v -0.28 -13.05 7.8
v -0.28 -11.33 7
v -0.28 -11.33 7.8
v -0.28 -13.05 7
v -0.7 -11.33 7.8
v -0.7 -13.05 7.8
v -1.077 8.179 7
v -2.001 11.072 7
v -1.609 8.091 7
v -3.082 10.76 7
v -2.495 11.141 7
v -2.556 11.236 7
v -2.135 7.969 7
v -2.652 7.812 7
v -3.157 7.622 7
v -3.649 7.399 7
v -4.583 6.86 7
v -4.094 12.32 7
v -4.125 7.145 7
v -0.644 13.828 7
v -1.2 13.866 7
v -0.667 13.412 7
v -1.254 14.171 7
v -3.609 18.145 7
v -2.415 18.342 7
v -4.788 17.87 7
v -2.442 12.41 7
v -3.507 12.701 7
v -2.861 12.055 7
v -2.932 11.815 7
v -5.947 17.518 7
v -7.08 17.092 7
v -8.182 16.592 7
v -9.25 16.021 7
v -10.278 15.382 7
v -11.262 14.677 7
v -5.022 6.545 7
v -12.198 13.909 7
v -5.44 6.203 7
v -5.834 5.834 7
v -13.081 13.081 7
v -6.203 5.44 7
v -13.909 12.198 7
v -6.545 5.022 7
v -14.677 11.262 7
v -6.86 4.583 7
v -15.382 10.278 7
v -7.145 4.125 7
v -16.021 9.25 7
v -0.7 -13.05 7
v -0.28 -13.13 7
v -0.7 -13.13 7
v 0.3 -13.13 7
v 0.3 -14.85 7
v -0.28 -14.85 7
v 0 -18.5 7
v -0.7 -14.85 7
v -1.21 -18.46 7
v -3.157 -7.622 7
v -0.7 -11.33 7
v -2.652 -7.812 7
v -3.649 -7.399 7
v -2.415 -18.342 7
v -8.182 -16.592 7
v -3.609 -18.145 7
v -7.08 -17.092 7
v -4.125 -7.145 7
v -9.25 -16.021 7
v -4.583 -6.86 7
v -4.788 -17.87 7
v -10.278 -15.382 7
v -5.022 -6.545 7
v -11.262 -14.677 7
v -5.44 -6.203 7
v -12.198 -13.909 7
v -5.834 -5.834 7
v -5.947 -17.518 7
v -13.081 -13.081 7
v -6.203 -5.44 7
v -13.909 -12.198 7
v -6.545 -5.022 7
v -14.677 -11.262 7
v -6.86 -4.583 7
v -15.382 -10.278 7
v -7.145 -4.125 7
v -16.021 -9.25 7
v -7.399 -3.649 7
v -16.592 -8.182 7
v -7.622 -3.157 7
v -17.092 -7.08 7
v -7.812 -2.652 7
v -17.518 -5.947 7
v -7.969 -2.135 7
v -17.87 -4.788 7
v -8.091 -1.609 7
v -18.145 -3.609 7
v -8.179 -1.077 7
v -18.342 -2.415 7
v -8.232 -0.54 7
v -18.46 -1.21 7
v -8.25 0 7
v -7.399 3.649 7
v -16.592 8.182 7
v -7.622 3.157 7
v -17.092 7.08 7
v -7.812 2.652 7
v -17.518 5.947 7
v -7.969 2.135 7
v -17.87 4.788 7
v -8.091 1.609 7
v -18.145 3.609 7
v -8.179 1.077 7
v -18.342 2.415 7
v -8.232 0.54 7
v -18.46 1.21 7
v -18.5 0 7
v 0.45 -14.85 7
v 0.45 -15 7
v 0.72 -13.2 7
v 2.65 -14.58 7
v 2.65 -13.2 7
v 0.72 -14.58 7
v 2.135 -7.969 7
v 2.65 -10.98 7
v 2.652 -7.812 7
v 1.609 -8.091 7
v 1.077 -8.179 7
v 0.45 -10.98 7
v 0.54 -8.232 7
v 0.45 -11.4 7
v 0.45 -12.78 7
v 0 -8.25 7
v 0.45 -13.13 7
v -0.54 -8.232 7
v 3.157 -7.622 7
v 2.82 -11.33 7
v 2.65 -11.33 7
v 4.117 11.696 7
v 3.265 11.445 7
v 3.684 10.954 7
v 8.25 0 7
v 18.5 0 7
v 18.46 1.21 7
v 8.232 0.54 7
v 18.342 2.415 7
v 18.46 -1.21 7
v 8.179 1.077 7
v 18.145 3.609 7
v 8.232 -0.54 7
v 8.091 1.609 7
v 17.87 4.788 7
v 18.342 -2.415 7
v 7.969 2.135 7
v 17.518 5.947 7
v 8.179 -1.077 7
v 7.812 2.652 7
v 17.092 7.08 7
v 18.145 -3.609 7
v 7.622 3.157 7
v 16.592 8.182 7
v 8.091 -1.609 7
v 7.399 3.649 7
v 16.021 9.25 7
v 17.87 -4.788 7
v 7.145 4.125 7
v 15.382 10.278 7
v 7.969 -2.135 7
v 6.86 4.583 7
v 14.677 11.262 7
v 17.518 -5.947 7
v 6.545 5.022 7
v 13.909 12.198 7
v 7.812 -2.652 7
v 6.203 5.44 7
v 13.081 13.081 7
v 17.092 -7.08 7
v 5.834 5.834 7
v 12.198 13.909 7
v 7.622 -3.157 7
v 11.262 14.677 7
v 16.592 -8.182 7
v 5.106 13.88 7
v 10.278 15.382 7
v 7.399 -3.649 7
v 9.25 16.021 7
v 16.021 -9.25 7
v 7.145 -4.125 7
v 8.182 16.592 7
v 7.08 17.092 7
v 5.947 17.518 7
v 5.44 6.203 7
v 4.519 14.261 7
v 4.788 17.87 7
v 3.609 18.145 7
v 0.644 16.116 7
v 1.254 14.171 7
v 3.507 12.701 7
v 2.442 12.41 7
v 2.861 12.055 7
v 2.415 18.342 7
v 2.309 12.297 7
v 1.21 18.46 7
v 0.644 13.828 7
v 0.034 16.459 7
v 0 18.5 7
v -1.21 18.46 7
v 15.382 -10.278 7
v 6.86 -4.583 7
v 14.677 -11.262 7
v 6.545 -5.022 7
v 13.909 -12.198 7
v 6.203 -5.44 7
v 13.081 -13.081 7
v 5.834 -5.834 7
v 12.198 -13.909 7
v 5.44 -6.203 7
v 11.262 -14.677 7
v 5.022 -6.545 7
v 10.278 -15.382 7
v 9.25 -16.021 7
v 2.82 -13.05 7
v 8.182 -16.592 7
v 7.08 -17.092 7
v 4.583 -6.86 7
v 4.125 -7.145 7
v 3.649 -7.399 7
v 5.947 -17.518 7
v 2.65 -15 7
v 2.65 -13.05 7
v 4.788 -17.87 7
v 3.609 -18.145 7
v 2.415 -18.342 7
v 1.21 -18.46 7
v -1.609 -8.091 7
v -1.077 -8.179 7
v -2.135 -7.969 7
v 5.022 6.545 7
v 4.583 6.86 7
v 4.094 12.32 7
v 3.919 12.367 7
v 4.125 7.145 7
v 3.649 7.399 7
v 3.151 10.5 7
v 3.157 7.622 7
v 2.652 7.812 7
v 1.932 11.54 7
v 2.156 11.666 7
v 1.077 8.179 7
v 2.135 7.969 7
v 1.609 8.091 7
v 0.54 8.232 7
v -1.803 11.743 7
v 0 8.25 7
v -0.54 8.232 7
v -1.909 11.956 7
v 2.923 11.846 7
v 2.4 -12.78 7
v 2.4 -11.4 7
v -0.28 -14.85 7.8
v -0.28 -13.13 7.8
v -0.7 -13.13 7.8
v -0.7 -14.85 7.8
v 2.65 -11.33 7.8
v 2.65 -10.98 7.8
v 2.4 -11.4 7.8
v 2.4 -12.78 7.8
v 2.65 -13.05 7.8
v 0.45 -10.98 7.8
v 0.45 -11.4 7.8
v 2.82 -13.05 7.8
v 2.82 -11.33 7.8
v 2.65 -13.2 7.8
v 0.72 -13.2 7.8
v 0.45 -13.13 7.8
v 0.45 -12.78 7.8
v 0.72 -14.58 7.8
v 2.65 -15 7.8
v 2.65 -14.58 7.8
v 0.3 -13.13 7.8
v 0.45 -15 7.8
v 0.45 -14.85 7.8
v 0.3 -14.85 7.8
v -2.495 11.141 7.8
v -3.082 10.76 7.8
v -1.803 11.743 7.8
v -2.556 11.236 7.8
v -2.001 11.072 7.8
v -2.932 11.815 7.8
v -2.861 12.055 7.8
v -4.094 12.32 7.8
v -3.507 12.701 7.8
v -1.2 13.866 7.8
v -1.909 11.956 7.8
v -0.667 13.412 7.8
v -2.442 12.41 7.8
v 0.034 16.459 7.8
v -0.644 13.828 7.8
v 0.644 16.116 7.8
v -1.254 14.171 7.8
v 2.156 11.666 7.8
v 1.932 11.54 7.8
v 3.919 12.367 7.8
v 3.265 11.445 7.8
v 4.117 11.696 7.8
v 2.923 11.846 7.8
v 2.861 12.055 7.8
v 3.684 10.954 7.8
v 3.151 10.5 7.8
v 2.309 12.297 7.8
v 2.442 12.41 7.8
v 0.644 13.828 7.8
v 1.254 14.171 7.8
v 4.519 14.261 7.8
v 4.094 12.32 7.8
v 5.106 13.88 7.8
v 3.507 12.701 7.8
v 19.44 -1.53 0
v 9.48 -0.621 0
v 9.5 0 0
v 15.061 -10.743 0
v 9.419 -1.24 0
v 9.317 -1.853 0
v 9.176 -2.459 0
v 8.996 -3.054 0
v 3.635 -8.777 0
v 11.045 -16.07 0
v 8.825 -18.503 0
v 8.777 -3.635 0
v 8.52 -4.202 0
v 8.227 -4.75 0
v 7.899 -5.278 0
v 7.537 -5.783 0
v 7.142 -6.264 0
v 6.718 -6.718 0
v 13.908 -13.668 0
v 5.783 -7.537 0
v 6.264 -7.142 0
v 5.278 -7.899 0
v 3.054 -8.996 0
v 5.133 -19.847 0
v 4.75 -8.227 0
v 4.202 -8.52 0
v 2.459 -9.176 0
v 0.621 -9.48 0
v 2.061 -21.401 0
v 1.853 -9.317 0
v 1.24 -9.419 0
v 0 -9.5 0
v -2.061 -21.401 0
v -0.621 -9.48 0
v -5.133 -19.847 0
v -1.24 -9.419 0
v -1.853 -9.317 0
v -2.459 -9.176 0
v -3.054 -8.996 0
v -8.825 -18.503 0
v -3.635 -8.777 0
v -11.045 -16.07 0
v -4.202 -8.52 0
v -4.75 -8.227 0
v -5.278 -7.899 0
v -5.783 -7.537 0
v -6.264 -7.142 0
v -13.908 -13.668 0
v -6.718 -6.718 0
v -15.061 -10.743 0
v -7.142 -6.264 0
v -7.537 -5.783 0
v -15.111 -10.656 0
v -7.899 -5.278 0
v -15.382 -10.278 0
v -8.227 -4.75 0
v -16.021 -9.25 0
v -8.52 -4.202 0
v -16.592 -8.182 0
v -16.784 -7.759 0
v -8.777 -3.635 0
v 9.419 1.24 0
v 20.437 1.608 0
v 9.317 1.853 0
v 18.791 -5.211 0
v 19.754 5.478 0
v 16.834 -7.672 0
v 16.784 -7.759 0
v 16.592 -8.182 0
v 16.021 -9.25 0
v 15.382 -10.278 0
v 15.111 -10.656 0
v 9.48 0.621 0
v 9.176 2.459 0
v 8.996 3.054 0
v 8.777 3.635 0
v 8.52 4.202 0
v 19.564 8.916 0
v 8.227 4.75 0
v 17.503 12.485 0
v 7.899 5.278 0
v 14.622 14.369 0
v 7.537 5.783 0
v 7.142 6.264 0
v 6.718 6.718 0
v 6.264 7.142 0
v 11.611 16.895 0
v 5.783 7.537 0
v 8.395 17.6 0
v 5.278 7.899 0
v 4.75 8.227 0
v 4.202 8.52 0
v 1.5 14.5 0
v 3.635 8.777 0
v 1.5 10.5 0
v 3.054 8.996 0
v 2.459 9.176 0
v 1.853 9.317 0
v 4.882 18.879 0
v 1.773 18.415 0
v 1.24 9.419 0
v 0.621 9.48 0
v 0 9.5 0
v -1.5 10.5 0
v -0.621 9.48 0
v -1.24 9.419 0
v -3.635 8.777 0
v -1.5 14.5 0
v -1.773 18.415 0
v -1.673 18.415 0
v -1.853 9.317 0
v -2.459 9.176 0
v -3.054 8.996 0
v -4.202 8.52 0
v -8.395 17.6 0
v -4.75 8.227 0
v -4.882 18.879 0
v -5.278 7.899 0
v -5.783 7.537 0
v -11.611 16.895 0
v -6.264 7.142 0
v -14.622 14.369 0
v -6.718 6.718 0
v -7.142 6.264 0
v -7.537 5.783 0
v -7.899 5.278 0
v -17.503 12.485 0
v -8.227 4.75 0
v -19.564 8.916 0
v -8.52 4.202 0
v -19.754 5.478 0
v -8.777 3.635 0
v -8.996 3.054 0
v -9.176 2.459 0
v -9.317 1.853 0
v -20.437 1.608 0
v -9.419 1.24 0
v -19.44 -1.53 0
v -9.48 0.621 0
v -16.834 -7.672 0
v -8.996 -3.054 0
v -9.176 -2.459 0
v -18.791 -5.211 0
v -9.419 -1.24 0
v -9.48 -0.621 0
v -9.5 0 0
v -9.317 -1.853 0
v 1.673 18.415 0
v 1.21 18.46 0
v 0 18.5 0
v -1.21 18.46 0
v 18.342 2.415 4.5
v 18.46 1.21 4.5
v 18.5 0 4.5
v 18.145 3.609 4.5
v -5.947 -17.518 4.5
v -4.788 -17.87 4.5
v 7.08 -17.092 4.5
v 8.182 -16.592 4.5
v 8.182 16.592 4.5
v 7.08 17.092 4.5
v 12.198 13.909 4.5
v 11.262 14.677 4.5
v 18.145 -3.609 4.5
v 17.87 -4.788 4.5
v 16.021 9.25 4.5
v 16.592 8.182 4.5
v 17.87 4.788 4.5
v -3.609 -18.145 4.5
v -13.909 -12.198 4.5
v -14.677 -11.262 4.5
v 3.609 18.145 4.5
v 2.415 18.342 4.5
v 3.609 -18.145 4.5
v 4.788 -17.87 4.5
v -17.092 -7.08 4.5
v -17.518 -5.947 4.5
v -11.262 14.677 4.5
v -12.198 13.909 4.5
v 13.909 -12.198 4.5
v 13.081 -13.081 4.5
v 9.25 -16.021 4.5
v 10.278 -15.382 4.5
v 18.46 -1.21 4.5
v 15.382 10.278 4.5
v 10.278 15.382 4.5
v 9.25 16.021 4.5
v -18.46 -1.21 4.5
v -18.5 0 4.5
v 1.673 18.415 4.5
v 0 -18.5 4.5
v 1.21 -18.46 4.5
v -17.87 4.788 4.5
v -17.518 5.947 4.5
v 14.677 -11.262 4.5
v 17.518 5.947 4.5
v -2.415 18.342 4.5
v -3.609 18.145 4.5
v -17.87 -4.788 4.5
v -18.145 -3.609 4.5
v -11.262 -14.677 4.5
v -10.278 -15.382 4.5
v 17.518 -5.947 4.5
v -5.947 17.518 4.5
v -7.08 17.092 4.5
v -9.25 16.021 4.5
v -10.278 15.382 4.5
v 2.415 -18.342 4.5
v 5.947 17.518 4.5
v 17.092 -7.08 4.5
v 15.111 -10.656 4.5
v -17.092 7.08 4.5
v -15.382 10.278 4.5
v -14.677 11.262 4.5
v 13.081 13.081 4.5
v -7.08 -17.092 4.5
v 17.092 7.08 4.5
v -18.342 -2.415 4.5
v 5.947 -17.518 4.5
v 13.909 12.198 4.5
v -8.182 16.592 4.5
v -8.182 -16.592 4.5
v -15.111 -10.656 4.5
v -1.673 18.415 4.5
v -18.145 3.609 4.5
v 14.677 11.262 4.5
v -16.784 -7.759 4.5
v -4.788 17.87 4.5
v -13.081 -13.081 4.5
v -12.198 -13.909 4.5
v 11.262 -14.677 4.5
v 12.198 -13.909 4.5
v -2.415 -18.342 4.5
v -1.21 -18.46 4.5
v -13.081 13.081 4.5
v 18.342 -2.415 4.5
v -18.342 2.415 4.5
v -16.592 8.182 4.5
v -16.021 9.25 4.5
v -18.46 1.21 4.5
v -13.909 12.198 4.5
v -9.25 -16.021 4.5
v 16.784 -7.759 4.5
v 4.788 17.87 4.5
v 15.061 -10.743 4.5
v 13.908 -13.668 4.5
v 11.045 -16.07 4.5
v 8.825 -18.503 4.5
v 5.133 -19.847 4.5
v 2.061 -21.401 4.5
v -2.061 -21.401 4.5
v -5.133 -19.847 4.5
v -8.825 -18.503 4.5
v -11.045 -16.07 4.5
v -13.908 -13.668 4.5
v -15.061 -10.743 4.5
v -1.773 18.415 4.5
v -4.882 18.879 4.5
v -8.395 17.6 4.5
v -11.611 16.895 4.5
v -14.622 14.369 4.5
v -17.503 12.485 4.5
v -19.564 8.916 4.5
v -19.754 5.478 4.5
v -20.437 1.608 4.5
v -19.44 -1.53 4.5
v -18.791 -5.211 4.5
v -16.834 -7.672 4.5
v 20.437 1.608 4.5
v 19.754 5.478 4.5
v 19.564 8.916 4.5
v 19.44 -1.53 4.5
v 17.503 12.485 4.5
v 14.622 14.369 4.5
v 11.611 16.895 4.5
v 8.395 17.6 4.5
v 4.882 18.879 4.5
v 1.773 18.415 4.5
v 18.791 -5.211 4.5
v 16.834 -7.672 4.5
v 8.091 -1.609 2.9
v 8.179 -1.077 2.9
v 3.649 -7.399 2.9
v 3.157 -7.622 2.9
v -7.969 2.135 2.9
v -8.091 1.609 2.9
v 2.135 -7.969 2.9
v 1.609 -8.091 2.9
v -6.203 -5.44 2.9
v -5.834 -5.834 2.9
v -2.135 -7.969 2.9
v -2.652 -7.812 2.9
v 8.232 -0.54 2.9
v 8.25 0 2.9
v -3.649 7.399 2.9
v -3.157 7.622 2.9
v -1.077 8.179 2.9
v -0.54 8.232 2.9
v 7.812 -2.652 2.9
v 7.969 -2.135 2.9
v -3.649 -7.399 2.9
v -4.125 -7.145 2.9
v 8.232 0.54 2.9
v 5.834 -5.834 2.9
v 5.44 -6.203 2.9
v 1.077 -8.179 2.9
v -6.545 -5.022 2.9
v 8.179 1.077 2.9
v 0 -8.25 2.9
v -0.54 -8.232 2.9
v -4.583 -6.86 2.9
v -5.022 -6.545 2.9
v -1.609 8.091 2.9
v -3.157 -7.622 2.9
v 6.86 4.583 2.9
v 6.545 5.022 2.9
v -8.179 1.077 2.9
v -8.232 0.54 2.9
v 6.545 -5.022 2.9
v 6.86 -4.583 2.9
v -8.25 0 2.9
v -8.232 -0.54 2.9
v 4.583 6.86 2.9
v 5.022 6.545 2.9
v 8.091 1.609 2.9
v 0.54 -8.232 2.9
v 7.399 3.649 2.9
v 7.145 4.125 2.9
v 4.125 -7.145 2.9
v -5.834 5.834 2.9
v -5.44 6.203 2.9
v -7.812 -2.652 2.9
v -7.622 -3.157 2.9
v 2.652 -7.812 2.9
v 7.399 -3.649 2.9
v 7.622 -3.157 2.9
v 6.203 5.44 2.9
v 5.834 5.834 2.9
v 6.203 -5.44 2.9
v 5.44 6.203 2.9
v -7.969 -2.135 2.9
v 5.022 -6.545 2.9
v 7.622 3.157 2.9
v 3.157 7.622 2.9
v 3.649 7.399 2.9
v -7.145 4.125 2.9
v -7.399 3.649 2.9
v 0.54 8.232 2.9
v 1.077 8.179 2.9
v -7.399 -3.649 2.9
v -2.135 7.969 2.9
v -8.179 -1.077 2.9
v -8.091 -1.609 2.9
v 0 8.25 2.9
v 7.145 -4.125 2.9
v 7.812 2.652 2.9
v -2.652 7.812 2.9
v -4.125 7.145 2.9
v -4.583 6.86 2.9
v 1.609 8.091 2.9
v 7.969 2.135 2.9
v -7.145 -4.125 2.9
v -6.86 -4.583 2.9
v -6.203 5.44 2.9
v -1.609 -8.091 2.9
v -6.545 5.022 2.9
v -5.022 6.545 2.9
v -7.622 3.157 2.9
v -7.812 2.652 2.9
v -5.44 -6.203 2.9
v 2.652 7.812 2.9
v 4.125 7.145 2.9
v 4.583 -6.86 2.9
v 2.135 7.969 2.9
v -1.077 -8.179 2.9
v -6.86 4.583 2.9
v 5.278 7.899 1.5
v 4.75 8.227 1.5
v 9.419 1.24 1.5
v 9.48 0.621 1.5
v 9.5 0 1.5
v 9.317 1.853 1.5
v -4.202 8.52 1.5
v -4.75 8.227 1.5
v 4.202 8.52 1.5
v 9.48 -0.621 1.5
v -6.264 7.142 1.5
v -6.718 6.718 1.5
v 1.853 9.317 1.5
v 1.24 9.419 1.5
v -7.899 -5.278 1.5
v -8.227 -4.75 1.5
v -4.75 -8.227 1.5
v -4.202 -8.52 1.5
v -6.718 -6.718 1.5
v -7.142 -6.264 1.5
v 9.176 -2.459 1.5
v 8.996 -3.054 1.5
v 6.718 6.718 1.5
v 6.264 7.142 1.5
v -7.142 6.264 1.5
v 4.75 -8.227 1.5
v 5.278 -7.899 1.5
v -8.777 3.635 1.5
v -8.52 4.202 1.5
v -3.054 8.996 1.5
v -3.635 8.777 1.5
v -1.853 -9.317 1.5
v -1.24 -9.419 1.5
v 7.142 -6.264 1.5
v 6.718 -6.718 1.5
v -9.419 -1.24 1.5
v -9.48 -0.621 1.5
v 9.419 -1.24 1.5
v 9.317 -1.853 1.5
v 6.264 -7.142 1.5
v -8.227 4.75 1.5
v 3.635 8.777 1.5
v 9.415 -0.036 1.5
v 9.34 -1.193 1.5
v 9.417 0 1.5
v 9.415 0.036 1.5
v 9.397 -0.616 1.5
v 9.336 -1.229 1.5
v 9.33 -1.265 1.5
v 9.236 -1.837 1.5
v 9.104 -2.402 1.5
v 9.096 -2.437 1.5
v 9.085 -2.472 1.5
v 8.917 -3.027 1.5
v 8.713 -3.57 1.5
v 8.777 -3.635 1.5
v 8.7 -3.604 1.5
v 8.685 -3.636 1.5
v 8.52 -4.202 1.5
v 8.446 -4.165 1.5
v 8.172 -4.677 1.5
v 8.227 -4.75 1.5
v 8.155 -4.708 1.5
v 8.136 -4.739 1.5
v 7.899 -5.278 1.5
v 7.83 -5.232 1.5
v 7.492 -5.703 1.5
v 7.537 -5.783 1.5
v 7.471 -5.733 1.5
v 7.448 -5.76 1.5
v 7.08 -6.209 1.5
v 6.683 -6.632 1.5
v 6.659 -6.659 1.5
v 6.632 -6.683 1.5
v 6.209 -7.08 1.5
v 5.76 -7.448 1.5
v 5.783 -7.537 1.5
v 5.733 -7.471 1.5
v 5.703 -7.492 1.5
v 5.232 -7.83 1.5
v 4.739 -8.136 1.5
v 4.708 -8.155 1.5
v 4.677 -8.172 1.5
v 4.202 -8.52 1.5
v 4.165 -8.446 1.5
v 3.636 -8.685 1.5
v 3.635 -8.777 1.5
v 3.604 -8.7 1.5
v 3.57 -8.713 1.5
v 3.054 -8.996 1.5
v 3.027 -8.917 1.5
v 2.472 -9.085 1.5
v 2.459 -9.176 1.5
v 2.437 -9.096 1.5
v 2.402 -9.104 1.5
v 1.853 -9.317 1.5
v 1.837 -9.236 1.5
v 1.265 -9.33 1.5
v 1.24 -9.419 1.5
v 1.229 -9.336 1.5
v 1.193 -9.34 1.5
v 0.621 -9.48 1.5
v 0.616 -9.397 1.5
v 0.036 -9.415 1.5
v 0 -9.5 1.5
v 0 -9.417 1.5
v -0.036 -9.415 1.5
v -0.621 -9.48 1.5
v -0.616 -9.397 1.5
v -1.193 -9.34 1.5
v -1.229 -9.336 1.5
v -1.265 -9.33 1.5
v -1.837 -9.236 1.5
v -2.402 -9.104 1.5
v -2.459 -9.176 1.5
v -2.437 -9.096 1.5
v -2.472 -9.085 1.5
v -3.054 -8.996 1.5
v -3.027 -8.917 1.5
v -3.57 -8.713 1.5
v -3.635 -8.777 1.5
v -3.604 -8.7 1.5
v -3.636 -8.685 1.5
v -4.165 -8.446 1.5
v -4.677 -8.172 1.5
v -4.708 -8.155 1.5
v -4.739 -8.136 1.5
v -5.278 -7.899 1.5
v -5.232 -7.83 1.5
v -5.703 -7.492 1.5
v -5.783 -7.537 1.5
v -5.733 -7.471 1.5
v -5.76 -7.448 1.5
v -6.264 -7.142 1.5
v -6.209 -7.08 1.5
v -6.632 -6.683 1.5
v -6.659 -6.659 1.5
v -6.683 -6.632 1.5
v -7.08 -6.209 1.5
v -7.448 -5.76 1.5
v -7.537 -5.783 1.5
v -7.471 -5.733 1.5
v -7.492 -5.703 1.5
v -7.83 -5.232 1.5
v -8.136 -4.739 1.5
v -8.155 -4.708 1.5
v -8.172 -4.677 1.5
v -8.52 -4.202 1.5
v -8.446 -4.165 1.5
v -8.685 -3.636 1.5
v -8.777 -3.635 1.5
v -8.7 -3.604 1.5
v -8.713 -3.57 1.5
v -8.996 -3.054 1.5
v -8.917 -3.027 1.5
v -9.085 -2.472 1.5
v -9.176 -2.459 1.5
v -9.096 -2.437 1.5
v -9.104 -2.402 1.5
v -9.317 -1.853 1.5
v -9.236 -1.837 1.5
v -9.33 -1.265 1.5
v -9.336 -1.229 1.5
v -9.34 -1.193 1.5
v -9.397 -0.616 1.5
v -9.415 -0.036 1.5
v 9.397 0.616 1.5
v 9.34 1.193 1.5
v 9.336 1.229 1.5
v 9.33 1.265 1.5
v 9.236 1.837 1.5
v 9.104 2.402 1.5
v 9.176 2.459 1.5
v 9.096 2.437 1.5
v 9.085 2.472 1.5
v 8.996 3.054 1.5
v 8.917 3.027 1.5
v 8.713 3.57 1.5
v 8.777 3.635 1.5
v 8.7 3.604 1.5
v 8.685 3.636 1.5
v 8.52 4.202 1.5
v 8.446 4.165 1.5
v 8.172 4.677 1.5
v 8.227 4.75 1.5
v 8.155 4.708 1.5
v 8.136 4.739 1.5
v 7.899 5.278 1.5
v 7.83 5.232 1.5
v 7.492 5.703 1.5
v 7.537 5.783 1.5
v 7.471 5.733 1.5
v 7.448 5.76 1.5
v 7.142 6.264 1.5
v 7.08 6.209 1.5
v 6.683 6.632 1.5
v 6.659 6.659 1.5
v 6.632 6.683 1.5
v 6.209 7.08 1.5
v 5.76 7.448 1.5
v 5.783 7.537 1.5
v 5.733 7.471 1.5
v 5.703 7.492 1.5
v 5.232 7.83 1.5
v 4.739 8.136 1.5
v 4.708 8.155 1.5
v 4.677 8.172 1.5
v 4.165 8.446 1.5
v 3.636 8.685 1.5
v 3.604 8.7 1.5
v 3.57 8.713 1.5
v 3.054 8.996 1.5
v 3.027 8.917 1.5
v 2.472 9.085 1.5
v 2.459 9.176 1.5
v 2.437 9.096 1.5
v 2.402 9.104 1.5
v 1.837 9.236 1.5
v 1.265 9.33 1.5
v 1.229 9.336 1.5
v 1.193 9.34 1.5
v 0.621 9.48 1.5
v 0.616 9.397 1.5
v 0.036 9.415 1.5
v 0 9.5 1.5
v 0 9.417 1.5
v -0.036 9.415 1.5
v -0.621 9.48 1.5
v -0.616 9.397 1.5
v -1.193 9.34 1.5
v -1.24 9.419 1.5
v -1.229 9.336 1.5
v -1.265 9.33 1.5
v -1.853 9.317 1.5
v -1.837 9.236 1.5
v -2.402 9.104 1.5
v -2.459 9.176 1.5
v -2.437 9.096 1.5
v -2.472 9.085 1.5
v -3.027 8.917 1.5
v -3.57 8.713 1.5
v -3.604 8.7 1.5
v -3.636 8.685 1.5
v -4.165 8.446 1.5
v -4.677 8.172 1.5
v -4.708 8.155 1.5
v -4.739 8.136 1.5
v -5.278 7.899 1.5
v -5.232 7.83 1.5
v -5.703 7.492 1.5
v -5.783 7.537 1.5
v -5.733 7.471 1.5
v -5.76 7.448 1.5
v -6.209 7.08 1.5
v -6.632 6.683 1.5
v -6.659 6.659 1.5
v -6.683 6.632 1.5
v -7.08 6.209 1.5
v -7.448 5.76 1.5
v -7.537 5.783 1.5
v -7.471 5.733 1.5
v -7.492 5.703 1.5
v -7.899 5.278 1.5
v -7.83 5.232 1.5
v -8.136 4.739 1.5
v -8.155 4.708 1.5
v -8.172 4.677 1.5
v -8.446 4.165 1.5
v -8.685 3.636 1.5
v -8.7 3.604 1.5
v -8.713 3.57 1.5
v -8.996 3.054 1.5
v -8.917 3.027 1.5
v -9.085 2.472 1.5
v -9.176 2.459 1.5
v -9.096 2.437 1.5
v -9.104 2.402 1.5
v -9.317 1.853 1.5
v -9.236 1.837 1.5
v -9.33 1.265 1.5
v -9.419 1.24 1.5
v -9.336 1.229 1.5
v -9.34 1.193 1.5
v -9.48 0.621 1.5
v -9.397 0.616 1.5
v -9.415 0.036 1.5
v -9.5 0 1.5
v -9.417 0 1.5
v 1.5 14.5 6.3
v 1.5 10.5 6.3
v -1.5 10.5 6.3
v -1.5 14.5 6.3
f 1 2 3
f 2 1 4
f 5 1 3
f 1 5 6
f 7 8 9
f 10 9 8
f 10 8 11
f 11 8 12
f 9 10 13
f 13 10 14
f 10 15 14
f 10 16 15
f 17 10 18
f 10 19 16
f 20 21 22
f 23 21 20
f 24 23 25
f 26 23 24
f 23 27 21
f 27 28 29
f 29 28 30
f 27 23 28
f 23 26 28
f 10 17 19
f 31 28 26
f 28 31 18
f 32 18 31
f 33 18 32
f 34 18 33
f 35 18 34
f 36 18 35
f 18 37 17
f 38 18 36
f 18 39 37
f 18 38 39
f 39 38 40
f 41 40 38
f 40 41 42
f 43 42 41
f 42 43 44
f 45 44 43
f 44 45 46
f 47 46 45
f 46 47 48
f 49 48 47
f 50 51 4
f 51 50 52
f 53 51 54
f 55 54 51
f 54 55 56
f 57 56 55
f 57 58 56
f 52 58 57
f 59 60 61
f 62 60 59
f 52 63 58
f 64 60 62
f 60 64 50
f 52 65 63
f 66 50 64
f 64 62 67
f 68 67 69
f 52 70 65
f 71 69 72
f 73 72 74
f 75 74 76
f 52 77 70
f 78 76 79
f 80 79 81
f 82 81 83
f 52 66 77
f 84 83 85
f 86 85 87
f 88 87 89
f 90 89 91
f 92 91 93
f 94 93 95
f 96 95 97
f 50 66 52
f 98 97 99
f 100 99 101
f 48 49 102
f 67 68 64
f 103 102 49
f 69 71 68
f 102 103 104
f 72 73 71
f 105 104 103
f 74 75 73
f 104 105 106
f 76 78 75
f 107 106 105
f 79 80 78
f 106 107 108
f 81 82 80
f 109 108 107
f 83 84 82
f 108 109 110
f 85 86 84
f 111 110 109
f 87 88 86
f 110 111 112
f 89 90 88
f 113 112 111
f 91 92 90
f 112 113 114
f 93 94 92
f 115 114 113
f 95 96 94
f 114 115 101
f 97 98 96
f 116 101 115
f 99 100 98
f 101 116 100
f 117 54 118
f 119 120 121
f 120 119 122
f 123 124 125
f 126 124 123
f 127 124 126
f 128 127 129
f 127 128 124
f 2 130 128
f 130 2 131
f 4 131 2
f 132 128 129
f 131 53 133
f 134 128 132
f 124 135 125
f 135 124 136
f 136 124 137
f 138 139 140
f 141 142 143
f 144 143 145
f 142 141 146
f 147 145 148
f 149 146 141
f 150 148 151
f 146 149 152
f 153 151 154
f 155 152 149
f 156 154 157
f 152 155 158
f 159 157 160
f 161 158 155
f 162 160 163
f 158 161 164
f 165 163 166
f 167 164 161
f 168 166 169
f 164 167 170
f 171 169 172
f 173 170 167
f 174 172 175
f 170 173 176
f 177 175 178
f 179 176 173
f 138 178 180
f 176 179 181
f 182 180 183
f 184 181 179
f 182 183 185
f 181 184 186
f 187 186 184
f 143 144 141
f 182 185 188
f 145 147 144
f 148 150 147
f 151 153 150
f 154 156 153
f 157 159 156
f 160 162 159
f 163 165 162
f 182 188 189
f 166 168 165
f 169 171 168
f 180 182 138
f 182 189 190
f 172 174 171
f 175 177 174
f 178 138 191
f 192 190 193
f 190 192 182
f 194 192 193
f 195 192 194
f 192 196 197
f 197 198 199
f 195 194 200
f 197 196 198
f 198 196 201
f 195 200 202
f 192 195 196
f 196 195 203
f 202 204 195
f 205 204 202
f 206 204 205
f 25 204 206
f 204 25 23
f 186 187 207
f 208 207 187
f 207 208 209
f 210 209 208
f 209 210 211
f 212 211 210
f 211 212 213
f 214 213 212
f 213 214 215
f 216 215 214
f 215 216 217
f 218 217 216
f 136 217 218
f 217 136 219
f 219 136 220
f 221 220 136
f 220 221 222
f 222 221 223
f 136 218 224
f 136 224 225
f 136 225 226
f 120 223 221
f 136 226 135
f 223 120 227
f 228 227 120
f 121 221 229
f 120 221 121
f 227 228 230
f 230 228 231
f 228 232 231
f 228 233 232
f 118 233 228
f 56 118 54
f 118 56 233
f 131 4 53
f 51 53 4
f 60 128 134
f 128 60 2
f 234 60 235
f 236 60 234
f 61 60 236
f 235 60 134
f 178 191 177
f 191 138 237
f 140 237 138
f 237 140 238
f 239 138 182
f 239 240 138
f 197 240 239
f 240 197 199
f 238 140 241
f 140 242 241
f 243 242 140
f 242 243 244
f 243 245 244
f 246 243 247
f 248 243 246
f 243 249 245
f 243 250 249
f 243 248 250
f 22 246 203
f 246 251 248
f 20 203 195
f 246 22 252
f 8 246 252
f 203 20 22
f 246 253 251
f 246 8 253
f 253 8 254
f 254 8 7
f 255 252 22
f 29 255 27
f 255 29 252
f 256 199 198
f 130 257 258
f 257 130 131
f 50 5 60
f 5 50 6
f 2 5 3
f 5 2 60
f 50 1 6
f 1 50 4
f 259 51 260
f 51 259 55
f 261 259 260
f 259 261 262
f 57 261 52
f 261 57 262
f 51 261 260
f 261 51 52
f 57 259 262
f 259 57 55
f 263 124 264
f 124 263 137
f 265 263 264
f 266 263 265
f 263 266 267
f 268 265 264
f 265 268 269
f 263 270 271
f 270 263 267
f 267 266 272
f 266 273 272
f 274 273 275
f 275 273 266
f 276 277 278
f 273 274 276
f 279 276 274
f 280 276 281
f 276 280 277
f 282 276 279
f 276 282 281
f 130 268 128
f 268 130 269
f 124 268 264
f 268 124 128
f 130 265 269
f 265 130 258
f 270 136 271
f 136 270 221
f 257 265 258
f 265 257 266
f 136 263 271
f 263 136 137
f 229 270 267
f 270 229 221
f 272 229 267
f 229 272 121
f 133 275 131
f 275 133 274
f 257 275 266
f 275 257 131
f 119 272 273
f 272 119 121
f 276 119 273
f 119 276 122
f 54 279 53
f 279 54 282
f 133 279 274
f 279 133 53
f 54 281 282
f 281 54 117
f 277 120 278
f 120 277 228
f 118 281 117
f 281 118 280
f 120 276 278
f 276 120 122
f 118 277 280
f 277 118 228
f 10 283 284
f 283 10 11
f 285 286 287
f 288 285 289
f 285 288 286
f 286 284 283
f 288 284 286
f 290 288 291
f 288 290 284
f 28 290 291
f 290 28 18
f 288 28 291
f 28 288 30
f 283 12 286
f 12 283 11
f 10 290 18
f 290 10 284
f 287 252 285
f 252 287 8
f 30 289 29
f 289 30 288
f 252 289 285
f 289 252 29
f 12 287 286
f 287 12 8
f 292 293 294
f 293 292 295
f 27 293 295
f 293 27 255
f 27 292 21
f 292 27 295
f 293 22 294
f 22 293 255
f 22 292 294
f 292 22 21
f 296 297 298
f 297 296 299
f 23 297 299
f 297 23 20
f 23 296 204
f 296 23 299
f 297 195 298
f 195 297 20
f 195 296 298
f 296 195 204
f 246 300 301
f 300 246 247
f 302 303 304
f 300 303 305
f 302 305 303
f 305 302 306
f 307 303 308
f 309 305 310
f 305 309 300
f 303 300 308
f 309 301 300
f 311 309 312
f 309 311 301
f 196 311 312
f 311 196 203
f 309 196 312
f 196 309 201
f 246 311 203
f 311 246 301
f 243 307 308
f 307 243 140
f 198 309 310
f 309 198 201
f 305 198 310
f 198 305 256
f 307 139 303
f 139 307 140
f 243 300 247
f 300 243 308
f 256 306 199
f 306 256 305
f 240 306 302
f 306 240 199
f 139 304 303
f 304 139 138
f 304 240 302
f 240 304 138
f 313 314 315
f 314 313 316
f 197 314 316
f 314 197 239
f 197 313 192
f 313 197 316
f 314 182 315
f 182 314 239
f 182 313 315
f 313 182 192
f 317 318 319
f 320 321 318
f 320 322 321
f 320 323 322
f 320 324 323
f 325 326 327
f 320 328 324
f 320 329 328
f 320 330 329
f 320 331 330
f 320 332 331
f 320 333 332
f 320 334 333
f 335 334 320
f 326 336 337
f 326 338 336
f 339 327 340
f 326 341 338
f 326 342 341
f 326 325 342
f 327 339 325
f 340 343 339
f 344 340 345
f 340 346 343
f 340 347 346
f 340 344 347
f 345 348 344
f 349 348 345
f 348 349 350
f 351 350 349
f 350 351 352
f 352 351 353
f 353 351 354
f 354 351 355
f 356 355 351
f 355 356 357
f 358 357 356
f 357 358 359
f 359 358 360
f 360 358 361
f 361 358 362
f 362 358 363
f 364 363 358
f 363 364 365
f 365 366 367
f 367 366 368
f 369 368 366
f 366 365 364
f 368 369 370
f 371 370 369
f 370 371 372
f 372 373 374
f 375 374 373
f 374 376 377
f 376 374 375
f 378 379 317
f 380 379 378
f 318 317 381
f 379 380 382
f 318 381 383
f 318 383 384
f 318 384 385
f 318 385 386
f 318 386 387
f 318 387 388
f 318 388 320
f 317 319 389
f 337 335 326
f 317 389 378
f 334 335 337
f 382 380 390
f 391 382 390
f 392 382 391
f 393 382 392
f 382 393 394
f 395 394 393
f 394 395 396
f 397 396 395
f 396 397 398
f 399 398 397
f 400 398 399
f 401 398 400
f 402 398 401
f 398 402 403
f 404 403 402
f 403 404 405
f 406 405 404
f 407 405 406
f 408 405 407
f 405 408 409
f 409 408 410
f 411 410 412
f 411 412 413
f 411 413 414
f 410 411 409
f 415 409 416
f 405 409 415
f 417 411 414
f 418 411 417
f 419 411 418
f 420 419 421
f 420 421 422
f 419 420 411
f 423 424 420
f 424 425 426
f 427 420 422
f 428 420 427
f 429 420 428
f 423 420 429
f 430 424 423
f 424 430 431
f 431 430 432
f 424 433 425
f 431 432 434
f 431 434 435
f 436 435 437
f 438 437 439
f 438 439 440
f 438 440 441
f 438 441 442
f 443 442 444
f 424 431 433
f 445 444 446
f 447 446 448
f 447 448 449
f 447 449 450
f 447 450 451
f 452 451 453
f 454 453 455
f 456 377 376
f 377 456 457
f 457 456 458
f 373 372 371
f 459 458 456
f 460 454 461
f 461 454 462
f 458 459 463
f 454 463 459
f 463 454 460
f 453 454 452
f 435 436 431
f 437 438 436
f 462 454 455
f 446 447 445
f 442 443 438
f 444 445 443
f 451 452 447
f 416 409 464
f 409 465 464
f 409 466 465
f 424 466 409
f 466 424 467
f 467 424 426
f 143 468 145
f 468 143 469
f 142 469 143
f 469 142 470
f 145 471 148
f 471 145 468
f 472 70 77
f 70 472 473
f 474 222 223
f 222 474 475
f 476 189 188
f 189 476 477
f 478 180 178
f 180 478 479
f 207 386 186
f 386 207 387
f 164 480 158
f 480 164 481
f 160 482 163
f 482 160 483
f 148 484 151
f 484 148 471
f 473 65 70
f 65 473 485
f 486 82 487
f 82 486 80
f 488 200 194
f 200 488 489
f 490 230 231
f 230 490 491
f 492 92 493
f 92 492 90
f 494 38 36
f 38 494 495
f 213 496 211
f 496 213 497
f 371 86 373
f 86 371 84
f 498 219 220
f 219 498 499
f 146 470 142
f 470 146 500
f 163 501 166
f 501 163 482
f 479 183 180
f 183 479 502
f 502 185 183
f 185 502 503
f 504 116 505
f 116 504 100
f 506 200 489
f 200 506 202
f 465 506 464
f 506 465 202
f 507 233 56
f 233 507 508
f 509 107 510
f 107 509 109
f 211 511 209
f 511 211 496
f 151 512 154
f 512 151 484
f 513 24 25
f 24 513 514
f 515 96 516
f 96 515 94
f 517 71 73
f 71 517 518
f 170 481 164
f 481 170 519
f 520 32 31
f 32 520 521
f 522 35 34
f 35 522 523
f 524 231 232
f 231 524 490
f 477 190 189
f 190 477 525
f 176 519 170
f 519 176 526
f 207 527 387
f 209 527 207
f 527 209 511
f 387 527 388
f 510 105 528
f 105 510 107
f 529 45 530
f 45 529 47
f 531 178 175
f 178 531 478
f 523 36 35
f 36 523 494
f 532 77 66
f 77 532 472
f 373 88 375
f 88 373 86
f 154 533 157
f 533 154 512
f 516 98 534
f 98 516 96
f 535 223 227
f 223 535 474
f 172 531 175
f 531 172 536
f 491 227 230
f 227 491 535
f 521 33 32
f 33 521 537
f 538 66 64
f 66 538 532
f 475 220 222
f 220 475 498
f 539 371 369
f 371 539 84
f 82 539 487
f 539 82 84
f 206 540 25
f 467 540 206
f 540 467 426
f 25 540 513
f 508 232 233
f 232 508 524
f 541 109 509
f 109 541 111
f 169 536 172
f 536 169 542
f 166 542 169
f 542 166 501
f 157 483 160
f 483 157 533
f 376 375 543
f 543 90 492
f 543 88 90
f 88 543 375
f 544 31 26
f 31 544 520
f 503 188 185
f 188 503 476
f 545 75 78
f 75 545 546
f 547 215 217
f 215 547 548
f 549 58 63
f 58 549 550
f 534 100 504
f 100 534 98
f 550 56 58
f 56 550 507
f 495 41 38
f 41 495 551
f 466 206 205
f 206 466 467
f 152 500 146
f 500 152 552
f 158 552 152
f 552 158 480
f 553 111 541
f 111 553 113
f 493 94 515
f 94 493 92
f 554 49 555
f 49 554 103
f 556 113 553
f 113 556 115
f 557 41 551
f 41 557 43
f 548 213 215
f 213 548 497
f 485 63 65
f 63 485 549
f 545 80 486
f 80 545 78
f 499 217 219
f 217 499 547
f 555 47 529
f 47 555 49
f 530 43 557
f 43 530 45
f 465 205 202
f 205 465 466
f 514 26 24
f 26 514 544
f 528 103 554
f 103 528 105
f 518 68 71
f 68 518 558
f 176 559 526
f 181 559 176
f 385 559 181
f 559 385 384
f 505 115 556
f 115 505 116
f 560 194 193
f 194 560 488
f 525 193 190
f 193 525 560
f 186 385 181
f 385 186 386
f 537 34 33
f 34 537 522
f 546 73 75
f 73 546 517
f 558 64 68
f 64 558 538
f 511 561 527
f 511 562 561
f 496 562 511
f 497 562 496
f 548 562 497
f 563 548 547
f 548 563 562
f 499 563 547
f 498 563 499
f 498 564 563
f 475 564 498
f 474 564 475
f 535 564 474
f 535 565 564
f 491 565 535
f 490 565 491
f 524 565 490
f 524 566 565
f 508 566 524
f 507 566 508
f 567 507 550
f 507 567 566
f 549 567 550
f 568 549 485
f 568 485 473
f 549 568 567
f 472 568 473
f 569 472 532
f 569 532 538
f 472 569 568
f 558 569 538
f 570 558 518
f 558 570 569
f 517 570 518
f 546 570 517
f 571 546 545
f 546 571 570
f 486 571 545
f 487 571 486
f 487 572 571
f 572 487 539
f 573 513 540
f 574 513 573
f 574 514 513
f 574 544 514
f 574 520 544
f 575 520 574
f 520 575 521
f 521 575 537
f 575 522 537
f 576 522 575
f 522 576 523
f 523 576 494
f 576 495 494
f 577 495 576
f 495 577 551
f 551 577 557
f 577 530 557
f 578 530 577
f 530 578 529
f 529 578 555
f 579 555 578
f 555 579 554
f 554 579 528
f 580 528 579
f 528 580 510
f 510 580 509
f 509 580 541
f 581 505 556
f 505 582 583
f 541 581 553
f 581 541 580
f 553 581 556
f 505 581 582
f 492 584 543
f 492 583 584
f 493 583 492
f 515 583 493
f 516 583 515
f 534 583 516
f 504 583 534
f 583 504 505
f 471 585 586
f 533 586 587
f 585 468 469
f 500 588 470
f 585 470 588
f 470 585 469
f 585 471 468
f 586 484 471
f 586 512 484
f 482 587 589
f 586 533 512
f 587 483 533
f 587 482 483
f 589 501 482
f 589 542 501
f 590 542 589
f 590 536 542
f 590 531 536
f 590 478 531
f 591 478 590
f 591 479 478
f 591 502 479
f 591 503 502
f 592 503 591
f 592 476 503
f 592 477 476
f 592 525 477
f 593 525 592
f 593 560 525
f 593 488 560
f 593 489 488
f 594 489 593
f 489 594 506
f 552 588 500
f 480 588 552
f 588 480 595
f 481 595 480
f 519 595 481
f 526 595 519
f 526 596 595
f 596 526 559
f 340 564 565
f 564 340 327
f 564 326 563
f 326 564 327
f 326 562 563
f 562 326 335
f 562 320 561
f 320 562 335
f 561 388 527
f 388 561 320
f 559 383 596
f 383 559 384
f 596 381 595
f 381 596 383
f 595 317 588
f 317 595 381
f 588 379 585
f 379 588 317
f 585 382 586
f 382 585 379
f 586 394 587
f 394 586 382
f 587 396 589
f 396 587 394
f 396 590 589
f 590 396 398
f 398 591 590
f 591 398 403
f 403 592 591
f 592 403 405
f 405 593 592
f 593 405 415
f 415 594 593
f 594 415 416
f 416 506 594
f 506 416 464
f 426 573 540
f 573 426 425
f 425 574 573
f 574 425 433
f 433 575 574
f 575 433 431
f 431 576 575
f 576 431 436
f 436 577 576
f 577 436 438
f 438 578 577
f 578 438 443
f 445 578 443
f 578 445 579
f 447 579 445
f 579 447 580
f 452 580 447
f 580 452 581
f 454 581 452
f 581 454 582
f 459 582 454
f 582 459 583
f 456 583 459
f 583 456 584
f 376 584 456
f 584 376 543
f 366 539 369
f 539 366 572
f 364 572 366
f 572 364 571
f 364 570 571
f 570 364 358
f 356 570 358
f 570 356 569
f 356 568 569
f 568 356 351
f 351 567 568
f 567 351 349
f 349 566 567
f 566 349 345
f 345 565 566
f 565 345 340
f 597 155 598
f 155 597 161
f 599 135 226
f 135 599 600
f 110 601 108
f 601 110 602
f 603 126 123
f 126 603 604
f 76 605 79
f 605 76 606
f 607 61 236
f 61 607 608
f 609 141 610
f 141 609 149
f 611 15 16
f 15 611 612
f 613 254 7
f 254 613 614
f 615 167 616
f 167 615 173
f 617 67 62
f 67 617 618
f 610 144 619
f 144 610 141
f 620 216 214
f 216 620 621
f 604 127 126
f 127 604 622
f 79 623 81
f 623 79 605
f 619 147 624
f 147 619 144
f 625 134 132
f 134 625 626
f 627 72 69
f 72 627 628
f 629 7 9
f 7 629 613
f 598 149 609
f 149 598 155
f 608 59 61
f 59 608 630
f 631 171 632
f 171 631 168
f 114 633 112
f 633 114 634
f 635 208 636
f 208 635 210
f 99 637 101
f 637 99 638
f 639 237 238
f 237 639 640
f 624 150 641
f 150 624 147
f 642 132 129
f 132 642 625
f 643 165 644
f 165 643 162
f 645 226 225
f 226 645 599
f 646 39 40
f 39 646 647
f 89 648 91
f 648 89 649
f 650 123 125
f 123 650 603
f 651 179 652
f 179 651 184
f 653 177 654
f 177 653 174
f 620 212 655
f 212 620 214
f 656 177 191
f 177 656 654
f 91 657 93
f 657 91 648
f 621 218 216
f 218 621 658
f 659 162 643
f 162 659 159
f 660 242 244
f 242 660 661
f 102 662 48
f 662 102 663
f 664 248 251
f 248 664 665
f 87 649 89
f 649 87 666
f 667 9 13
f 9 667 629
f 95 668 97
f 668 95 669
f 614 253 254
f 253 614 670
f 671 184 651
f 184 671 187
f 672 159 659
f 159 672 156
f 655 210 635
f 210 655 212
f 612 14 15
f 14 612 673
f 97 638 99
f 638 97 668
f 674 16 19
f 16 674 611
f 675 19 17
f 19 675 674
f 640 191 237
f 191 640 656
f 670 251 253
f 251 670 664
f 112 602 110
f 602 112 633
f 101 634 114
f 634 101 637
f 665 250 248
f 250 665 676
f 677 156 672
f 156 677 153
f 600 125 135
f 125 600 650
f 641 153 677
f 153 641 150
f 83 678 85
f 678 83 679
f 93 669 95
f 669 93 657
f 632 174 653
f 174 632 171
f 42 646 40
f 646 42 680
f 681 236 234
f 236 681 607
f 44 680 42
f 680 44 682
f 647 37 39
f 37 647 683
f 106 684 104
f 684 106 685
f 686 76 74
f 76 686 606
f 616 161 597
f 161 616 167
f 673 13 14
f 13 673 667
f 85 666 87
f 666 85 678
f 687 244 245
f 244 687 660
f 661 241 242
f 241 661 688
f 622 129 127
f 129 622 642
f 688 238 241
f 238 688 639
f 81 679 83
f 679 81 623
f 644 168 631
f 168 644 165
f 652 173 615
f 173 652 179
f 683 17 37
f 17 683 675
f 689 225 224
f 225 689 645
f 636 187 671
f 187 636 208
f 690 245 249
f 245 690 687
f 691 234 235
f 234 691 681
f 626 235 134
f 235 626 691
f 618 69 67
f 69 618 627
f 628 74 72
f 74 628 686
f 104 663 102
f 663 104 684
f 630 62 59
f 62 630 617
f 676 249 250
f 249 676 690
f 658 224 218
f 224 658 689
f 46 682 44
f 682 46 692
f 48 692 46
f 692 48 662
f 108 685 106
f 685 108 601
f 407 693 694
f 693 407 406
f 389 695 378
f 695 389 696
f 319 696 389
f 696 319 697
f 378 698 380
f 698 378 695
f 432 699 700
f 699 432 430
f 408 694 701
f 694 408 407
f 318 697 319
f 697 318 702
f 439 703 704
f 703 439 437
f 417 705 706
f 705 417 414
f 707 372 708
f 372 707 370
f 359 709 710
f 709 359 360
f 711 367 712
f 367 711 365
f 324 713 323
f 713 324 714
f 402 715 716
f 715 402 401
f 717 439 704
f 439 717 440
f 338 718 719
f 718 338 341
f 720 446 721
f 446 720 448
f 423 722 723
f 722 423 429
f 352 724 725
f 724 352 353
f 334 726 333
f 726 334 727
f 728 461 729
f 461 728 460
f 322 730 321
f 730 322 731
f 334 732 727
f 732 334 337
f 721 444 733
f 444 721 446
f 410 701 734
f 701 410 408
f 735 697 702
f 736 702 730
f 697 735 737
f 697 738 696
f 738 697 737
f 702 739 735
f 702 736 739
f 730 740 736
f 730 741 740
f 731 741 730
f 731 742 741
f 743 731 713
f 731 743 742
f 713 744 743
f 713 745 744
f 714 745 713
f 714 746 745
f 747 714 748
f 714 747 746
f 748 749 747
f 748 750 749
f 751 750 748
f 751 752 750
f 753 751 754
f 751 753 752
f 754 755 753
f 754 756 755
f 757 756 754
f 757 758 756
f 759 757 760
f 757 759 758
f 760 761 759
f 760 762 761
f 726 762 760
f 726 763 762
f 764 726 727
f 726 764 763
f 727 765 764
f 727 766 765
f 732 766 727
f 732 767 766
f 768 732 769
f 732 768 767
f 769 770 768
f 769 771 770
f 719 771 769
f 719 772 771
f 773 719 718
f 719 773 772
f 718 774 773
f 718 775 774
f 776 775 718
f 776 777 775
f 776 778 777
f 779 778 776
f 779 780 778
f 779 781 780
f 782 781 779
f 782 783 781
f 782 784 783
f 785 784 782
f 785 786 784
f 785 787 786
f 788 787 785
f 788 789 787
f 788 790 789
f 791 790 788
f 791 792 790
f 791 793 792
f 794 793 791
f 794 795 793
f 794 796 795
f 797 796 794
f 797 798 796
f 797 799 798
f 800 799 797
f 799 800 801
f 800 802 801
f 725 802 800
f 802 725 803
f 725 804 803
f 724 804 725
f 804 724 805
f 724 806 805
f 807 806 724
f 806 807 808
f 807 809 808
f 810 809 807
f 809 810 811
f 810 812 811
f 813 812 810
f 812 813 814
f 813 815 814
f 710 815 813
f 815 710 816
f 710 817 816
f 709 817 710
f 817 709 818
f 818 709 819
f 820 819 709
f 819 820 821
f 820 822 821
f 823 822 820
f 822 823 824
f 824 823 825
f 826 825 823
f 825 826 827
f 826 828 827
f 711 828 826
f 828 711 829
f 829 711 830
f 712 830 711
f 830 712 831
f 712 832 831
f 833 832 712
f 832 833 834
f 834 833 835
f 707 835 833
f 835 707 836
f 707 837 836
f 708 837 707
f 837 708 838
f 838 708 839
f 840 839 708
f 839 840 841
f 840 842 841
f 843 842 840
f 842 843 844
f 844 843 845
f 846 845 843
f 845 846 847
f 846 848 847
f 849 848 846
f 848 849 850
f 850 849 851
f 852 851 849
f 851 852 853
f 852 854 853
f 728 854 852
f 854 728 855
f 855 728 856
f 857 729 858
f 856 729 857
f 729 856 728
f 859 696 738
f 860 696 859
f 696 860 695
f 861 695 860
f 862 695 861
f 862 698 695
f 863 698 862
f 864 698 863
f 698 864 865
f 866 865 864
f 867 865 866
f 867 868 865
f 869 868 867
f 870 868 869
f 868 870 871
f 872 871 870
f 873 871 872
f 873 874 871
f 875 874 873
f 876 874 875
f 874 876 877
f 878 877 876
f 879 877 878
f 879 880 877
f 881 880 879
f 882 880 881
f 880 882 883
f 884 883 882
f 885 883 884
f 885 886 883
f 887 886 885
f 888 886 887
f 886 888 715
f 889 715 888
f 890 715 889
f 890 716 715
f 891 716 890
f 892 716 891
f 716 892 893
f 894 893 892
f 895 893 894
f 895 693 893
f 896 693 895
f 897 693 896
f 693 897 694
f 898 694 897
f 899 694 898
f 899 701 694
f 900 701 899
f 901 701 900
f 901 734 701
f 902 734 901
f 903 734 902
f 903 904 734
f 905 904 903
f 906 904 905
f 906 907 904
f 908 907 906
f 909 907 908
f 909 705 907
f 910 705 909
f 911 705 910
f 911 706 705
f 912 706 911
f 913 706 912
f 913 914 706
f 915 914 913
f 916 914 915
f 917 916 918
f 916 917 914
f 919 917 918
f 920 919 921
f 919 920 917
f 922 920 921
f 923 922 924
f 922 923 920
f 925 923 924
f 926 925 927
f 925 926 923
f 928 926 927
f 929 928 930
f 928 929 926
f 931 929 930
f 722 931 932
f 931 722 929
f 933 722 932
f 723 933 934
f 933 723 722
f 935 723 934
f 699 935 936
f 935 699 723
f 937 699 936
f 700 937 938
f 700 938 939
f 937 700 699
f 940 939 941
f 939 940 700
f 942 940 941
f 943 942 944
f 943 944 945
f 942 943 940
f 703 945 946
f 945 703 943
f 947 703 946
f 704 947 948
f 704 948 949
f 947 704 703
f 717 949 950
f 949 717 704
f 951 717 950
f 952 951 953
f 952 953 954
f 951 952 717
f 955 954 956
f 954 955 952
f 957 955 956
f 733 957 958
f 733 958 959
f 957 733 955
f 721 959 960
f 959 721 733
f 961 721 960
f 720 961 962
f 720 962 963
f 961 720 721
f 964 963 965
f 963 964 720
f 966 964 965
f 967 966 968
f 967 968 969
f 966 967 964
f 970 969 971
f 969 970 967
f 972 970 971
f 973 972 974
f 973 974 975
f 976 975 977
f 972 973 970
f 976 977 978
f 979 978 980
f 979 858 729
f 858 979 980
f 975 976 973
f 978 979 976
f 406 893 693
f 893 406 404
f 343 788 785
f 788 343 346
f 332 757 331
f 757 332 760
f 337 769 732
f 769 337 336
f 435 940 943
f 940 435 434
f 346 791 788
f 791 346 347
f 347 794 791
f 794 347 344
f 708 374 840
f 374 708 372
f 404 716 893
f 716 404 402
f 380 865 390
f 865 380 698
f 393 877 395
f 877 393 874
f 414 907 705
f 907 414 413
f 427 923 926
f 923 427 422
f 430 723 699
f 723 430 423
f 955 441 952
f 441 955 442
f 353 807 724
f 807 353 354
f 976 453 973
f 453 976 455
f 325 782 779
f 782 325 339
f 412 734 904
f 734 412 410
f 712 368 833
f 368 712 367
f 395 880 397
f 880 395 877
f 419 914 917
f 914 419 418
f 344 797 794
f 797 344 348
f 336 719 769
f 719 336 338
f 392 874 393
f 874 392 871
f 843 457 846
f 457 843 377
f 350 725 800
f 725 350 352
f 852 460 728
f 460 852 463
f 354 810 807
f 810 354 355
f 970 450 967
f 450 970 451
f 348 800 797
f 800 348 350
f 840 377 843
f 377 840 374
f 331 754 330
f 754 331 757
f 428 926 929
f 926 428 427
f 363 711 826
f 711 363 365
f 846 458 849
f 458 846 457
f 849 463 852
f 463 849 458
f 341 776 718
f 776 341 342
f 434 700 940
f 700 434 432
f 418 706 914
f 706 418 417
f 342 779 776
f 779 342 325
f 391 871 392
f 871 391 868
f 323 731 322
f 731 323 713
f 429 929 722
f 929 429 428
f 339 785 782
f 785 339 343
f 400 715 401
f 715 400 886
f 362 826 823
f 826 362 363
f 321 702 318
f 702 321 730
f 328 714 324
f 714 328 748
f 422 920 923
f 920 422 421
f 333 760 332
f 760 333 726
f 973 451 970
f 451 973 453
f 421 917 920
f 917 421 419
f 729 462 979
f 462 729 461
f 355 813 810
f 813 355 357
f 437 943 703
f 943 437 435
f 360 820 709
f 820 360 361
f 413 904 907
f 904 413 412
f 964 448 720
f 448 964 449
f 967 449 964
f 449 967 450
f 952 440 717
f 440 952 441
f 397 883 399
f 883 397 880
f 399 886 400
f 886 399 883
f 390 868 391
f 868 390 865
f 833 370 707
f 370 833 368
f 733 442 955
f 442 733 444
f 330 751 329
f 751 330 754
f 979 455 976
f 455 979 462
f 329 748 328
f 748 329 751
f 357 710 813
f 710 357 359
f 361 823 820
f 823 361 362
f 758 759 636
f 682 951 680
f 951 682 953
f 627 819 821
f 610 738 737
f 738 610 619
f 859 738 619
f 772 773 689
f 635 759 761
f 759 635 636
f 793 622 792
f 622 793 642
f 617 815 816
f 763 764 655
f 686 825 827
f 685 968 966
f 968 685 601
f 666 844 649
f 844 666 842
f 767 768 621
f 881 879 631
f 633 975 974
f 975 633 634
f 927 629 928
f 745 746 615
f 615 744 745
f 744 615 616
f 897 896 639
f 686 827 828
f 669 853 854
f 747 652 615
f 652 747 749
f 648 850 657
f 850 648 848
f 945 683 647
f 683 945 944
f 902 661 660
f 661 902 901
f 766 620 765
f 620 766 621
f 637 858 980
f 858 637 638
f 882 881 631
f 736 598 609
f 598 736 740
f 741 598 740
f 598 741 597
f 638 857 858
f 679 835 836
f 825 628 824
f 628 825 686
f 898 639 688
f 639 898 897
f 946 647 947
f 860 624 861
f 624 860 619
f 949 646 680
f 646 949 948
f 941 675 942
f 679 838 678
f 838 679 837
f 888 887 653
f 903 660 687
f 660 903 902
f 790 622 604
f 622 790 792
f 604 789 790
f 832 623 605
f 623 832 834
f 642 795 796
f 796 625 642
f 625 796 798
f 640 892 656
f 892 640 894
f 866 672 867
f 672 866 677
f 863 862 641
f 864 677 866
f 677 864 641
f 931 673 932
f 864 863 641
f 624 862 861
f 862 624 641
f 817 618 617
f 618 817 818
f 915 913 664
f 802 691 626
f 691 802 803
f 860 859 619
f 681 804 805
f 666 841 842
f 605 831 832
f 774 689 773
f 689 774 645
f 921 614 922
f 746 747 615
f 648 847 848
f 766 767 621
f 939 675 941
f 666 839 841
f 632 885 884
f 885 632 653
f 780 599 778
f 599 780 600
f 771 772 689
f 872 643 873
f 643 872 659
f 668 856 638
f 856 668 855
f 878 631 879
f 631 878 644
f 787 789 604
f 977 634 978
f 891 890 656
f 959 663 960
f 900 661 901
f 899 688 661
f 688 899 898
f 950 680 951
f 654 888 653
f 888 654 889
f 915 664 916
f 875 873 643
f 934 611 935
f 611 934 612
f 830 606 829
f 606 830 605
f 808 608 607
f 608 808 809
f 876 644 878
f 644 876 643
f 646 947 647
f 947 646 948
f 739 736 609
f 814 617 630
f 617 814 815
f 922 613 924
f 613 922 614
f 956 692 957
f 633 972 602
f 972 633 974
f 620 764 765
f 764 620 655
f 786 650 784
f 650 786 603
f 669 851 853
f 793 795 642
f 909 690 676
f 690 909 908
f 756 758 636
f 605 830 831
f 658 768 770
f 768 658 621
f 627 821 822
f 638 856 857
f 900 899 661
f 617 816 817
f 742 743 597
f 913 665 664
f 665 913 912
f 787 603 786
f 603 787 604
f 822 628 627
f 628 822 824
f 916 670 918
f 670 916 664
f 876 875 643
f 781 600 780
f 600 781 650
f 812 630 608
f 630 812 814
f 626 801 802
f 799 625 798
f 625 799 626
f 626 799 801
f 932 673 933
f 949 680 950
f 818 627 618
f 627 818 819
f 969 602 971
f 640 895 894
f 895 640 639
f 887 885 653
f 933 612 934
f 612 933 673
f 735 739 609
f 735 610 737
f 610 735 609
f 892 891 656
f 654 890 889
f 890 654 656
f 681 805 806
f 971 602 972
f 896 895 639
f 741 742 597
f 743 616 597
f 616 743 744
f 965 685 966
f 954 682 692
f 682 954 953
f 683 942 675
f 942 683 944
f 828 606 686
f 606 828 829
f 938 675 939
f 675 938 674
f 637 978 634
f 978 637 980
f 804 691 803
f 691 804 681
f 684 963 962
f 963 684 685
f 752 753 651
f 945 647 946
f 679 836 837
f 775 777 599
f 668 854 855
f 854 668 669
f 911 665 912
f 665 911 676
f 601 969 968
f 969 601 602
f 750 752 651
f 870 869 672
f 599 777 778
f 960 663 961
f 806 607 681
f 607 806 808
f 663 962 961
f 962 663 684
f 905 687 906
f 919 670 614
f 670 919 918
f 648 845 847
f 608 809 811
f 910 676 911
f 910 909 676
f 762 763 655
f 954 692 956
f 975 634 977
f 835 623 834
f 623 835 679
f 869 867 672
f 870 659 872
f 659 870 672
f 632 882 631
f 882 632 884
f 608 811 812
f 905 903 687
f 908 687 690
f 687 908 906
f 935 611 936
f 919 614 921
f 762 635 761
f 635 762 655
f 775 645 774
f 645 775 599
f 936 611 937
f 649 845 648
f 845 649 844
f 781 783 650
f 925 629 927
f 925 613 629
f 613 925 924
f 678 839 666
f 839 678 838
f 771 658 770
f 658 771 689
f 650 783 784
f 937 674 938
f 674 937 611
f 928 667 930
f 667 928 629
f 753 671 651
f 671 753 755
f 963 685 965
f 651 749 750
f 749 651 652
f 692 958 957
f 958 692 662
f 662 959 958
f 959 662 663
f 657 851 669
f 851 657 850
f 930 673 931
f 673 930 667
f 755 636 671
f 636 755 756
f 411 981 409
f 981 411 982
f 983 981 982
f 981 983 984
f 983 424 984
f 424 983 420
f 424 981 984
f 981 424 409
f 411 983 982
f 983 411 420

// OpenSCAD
/*
  Elna Supermatic single cam 12
  Name: Spindle
  Status: candidate
  Visible raised number and stitch preview.

  IMPORTANT:
  Labels are raised geometry, not engraved text. They should be visible in render and print.
  Cam profile is still a candidate and must be verified against real photos/STL.

  License: GPL-3.0-or-later.
*/

$fn = 96;

disc_thickness = 7;
body_radius = 17;
outer_reference_radius = 18.5;
lobe_thickness = 4.5;
label_height = 0.80;

inner_hole_rad = 8.25;
hole_bigger_rad = 9.5;
bigger_hole_ht = 1.5;
hole_cone_ht = 1.5;
cut_errors = 0.1;

gap_to_transporthole = 1;
transporthole_width = 3;
transporthole_depth = 5.5;
transporthole_length = 4;

module lobe_profile() {
    polygon(points=[
        [-1.7731, 18.4148],
        [1.7731, 18.4148],
        [4.8824, 18.8789],
        [8.3950, 17.6004],
        [11.6113, 16.8946],
        [14.6216, 14.3686],
        [17.5035, 12.4851],
        [19.5642, 8.9159],
        [19.7544, 5.4784],
        [20.4368, 1.6084],
        [19.4399, -1.5300],
        [18.7908, -5.2111],
        [16.8343, -7.6718],
        [15.0611, -10.7430],
        [13.9084, -13.6677],
        [11.0449, -16.0705],
        [8.8255, -18.5030],
        [5.1328, -19.8470],
        [2.0607, -21.4010],
        [-2.0607, -21.4010],
        [-5.1328, -19.8470],
        [-8.8255, -18.5030],
        [-11.0449, -16.0705],
        [-13.9084, -13.6677],
        [-15.0611, -10.7430],
        [-16.8343, -7.6718],
        [-18.7908, -5.2111],
        [-19.4399, -1.5300],
        [-20.4368, 1.6084],
        [-19.7544, 5.4784],
        [-19.5642, 8.9159],
        [-17.5035, 12.4851],
        [-14.6216, 14.3686],
        [-11.6113, 16.8946],
        [-8.3950, 17.6004],
        [-4.8824, 18.8789]
    ]);
}

module digit_segments(d) {
    // 7-segment digit, raised from cubes. Local digit approx 2.4 x 4.0 mm.
    seg_w = 2.2;
    seg_t = 0.42;
    seg_v = 1.72;

    module hseg(y) {
        translate([-seg_w/2, y, disc_thickness])
            cube([seg_w, seg_t, label_height]);
    }
    module vseg(x, y) {
        translate([x, y, disc_thickness])
            cube([seg_t, seg_v, label_height]);
    }

    // segment map: a top, b upper-right, c lower-right, d bottom, e lower-left, f upper-left, g middle
    if (d == 0) { hseg(1.8); vseg(0.85,0.15); vseg(0.85,-1.65); hseg(-1.8); vseg(-1.25,-1.65); vseg(-1.25,0.15); }
    if (d == 1) { vseg(0.85,0.15); vseg(0.85,-1.65); }
    if (d == 2) { hseg(1.8); vseg(0.85,0.15); hseg(0); vseg(-1.25,-1.65); hseg(-1.8); }
    if (d == 3) { hseg(1.8); vseg(0.85,0.15); hseg(0); vseg(0.85,-1.65); hseg(-1.8); }
    if (d == 4) { vseg(-1.25,0.15); hseg(0); vseg(0.85,0.15); vseg(0.85,-1.65); }
    if (d == 5) { hseg(1.8); vseg(-1.25,0.15); hseg(0); vseg(0.85,-1.65); hseg(-1.8); }
    if (d == 6) { hseg(1.8); vseg(-1.25,0.15); hseg(0); vseg(0.85,-1.65); vseg(-1.25,-1.65); hseg(-1.8); }
    if (d == 7) { hseg(1.8); vseg(0.85,0.15); vseg(0.85,-1.65); }
    if (d == 8) { hseg(1.8); vseg(0.85,0.15); vseg(0.85,-1.65); hseg(-1.8); vseg(-1.25,-1.65); vseg(-1.25,0.15); hseg(0); }
    if (d == 9) { hseg(1.8); vseg(0.85,0.15); vseg(0.85,-1.65); hseg(-1.8); vseg(-1.25,0.15); hseg(0); }
}

module raised_cam_number() {
    translate([-1.55, -13.2, 0]) digit_segments(1);
    translate([ 1.55, -13.2, 0]) digit_segments(2);
}

module raised_stitch_preview() {
            translate([-4.0940, 12.3200, disc_thickness])
                rotate([0,0,-57.0278])
                    cube(size=[1.8595, 0.7000, 0.8000], center=false);
            translate([-3.0590, 11.3840, disc_thickness])
                rotate([0,0,-16.4306])
                    cube(size=[1.1030, 0.7000, 0.8000], center=false);
            translate([-1.9090, 11.9560, disc_thickness])
                rotate([0,0,49.5351])
                    cube(size=[1.9138, 0.7000, 0.8000], center=false);
            translate([-0.6440, 13.8280, disc_thickness])
                rotate([0,0,60.6232])
                    cube(size=[2.6256, 0.7000, 0.8000], center=false);
            translate([0.6440, 13.8280, disc_thickness])
                rotate([0,0,-60.6232])
                    cube(size=[2.6256, 0.7000, 0.8000], center=false);
            translate([1.9090, 11.9560, disc_thickness])
                rotate([0,0,-49.5351])
                    cube(size=[1.9138, 0.7000, 0.8000], center=false);
            translate([3.0590, 11.3840, disc_thickness])
                rotate([0,0,16.4306])
                    cube(size=[1.1030, 0.7000, 0.8000], center=false);
            translate([4.0940, 12.3200, disc_thickness])
                rotate([0,0,57.0278])
                    cube(size=[1.8595, 0.7000, 0.8000], center=false);
}

module elna_single_cam_12() {
    difference() {
        union() {
            // body
            cylinder(h = disc_thickness, r = body_radius);
            cylinder(h = disc_thickness, r = outer_reference_radius);

            // lower cam contour
            linear_extrude(height = lobe_thickness)
                lobe_profile();

            // visible raised labels
            raised_cam_number();
            raised_stitch_preview();
        }

        // Main shaft hole
        translate([0, 0, disc_thickness / 2])
            cylinder(h = disc_thickness + label_height + 1, r = inner_hole_rad, center = true);

        // Lower widened hole
        translate([0, 0, -cut_errors])
            cylinder(h = bigger_hole_ht + cut_errors, r = hole_bigger_rad);

        // Taper from widened hole to main hole
        translate([0, 0, bigger_hole_ht - cut_errors])
            cylinder(h = hole_cone_ht, r1 = hole_bigger_rad, r2 = inner_hole_rad);

        // Transport slot
        translate([0, hole_bigger_rad + gap_to_transporthole + transporthole_length / 2,
                   transporthole_depth / 2 - cut_errors])
            cube(size = [transporthole_width, transporthole_length, transporthole_depth + label_height + 1], center = true);
    }
}

elna_single_cam_12();
